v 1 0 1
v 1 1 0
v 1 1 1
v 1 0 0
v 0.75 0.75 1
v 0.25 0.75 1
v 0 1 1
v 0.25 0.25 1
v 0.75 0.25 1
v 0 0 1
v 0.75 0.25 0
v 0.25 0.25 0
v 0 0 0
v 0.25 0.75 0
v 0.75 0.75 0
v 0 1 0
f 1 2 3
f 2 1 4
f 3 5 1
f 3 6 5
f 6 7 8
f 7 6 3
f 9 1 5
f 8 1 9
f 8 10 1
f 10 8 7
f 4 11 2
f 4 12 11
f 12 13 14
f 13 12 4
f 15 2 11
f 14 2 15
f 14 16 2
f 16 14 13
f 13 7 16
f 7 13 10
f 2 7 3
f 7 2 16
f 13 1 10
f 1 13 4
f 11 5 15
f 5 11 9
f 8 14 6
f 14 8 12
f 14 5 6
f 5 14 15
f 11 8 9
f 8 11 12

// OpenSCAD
difference() {
   cube();
   translate([0.25,0.25,0]) scale([0.5,0.5,1]) cube();
}
